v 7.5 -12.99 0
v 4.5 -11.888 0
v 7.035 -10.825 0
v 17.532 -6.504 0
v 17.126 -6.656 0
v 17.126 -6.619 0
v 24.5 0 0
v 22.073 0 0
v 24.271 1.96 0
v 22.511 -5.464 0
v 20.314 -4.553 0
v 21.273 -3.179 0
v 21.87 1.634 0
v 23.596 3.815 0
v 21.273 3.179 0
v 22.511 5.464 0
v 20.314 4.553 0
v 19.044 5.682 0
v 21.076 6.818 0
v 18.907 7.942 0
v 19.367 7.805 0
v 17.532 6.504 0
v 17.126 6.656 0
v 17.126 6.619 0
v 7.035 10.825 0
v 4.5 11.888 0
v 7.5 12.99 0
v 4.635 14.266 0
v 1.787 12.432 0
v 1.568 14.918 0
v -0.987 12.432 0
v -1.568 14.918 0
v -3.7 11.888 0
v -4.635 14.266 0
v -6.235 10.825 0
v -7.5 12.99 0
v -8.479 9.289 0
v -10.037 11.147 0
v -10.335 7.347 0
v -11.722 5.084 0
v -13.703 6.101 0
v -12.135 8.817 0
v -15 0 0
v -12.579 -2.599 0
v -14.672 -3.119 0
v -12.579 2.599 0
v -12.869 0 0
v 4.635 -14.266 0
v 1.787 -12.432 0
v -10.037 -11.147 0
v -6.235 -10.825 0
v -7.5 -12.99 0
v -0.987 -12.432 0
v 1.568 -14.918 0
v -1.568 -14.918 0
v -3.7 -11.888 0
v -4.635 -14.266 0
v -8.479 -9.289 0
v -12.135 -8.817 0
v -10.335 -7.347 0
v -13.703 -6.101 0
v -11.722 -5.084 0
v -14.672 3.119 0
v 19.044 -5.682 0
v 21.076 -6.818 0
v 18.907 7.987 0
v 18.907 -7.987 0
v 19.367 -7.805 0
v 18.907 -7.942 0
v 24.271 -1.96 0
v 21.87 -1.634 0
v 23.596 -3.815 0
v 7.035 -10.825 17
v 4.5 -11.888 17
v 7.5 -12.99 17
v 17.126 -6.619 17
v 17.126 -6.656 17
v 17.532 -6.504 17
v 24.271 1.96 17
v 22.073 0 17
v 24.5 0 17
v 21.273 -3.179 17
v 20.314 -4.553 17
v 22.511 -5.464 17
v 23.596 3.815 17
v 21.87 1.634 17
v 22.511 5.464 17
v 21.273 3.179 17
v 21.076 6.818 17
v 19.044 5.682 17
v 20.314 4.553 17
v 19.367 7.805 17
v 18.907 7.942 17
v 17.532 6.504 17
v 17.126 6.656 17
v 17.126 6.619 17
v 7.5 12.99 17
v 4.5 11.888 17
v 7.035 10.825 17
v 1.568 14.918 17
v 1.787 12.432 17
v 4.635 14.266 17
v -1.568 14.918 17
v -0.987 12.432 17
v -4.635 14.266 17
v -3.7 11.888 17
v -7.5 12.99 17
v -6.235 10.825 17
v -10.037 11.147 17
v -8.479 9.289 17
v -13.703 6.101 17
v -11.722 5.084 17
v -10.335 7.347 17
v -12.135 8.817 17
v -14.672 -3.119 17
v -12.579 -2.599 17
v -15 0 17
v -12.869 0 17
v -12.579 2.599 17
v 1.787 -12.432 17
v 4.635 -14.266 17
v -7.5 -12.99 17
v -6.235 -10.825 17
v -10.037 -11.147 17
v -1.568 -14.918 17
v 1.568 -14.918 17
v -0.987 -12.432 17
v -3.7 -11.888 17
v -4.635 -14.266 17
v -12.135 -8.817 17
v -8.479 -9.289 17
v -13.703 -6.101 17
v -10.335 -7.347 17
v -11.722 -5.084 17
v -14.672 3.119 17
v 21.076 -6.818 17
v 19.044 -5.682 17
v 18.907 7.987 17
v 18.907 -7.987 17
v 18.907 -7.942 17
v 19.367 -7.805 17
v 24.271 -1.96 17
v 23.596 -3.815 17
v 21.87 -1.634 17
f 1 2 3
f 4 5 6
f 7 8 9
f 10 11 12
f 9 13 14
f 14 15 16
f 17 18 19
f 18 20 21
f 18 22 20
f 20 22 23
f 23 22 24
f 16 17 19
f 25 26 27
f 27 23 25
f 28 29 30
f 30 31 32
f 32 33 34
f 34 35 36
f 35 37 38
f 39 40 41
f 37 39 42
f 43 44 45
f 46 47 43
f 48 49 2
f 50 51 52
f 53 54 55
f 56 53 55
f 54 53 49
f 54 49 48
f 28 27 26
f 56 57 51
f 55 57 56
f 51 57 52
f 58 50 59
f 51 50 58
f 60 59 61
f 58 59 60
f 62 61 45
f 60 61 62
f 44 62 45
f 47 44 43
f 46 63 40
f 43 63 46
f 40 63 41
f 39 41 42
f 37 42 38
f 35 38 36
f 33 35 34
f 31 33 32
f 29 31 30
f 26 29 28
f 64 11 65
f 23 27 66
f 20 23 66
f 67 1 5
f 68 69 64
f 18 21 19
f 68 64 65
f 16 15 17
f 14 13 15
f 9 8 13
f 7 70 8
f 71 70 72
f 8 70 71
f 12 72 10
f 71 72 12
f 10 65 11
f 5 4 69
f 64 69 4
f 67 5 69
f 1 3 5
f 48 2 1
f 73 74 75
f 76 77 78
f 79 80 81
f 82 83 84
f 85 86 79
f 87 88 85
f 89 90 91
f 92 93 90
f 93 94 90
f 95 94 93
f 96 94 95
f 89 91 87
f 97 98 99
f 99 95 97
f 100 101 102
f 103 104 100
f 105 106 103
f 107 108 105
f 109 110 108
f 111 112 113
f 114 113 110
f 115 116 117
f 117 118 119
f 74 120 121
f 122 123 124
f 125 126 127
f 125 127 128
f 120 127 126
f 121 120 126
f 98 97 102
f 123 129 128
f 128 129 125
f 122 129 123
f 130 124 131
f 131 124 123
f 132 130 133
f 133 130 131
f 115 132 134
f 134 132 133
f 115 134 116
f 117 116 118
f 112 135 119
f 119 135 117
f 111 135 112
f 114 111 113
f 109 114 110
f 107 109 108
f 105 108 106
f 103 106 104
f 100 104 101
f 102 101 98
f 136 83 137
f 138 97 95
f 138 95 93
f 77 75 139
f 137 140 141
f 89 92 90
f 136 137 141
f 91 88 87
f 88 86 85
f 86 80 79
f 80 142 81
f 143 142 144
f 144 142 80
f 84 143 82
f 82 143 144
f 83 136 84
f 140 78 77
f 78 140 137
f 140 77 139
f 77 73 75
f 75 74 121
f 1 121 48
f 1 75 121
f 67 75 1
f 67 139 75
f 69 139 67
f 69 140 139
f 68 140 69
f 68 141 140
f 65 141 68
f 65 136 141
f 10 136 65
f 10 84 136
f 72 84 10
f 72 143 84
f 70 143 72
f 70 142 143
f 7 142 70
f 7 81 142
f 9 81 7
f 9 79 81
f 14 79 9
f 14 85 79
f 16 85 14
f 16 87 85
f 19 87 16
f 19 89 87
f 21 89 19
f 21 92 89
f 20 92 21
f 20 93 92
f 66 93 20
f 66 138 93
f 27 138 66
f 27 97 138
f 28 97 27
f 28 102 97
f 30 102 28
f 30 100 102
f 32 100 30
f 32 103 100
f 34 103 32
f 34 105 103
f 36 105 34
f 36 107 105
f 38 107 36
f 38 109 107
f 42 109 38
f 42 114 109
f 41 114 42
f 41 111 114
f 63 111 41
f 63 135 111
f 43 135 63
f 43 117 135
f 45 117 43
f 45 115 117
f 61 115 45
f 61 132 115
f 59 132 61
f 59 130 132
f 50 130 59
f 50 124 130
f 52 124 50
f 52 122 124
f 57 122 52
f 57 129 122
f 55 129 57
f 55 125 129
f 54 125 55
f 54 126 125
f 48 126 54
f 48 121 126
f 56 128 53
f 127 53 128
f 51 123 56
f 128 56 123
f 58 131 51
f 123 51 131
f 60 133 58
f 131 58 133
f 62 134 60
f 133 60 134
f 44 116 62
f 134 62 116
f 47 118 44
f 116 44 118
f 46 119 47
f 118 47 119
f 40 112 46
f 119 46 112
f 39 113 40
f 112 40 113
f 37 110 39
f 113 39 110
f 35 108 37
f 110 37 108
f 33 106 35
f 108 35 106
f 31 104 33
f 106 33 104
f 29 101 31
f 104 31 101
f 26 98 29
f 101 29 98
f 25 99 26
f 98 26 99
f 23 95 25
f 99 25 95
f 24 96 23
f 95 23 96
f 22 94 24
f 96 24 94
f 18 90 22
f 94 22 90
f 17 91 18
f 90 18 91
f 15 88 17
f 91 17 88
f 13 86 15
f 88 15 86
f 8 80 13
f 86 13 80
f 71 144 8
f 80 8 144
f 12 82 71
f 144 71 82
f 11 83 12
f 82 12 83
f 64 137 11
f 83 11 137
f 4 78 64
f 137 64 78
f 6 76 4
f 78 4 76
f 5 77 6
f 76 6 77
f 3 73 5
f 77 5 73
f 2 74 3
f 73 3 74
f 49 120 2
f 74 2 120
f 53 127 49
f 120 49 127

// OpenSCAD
r1 = 8.5;
r2 = 15;
height = 17;
distance = 16;
wall = 3;

angle1 = 20;
angle2 = 30;

total_x = r2 * 2 + distance;
total_y = r2 * 2;
innerscale_x = total_x / (total_x + wall * 2);
innerscale_y = total_y / (total_y + wall * 2);

linear_extrude(height) 
  difference() {
    flat_shape();
    translate([0.4, 0, 0])
      scale([innerscale_x, innerscale_y, 1]) 
        flat_shape();
  }

module flat_shape() {
  union() {
    translate([distance, 0, 0])
      circle(r1);
    circle(r2);
    trapezoid(
      r1 * sin(angle1) + distance, 
      r1 * cos(angle1), 
      r2 * sin(angle2), 
      r2 * cos(angle2));
  }
} 

module trapezoid(x1, y1, x2, y2) {
  polygon([
      [x1,   y1], 
      [x1, - y1], 
      [x2,   y2], 
      [x2, - y2]
    ], [[1,0,2,3]]);
}
